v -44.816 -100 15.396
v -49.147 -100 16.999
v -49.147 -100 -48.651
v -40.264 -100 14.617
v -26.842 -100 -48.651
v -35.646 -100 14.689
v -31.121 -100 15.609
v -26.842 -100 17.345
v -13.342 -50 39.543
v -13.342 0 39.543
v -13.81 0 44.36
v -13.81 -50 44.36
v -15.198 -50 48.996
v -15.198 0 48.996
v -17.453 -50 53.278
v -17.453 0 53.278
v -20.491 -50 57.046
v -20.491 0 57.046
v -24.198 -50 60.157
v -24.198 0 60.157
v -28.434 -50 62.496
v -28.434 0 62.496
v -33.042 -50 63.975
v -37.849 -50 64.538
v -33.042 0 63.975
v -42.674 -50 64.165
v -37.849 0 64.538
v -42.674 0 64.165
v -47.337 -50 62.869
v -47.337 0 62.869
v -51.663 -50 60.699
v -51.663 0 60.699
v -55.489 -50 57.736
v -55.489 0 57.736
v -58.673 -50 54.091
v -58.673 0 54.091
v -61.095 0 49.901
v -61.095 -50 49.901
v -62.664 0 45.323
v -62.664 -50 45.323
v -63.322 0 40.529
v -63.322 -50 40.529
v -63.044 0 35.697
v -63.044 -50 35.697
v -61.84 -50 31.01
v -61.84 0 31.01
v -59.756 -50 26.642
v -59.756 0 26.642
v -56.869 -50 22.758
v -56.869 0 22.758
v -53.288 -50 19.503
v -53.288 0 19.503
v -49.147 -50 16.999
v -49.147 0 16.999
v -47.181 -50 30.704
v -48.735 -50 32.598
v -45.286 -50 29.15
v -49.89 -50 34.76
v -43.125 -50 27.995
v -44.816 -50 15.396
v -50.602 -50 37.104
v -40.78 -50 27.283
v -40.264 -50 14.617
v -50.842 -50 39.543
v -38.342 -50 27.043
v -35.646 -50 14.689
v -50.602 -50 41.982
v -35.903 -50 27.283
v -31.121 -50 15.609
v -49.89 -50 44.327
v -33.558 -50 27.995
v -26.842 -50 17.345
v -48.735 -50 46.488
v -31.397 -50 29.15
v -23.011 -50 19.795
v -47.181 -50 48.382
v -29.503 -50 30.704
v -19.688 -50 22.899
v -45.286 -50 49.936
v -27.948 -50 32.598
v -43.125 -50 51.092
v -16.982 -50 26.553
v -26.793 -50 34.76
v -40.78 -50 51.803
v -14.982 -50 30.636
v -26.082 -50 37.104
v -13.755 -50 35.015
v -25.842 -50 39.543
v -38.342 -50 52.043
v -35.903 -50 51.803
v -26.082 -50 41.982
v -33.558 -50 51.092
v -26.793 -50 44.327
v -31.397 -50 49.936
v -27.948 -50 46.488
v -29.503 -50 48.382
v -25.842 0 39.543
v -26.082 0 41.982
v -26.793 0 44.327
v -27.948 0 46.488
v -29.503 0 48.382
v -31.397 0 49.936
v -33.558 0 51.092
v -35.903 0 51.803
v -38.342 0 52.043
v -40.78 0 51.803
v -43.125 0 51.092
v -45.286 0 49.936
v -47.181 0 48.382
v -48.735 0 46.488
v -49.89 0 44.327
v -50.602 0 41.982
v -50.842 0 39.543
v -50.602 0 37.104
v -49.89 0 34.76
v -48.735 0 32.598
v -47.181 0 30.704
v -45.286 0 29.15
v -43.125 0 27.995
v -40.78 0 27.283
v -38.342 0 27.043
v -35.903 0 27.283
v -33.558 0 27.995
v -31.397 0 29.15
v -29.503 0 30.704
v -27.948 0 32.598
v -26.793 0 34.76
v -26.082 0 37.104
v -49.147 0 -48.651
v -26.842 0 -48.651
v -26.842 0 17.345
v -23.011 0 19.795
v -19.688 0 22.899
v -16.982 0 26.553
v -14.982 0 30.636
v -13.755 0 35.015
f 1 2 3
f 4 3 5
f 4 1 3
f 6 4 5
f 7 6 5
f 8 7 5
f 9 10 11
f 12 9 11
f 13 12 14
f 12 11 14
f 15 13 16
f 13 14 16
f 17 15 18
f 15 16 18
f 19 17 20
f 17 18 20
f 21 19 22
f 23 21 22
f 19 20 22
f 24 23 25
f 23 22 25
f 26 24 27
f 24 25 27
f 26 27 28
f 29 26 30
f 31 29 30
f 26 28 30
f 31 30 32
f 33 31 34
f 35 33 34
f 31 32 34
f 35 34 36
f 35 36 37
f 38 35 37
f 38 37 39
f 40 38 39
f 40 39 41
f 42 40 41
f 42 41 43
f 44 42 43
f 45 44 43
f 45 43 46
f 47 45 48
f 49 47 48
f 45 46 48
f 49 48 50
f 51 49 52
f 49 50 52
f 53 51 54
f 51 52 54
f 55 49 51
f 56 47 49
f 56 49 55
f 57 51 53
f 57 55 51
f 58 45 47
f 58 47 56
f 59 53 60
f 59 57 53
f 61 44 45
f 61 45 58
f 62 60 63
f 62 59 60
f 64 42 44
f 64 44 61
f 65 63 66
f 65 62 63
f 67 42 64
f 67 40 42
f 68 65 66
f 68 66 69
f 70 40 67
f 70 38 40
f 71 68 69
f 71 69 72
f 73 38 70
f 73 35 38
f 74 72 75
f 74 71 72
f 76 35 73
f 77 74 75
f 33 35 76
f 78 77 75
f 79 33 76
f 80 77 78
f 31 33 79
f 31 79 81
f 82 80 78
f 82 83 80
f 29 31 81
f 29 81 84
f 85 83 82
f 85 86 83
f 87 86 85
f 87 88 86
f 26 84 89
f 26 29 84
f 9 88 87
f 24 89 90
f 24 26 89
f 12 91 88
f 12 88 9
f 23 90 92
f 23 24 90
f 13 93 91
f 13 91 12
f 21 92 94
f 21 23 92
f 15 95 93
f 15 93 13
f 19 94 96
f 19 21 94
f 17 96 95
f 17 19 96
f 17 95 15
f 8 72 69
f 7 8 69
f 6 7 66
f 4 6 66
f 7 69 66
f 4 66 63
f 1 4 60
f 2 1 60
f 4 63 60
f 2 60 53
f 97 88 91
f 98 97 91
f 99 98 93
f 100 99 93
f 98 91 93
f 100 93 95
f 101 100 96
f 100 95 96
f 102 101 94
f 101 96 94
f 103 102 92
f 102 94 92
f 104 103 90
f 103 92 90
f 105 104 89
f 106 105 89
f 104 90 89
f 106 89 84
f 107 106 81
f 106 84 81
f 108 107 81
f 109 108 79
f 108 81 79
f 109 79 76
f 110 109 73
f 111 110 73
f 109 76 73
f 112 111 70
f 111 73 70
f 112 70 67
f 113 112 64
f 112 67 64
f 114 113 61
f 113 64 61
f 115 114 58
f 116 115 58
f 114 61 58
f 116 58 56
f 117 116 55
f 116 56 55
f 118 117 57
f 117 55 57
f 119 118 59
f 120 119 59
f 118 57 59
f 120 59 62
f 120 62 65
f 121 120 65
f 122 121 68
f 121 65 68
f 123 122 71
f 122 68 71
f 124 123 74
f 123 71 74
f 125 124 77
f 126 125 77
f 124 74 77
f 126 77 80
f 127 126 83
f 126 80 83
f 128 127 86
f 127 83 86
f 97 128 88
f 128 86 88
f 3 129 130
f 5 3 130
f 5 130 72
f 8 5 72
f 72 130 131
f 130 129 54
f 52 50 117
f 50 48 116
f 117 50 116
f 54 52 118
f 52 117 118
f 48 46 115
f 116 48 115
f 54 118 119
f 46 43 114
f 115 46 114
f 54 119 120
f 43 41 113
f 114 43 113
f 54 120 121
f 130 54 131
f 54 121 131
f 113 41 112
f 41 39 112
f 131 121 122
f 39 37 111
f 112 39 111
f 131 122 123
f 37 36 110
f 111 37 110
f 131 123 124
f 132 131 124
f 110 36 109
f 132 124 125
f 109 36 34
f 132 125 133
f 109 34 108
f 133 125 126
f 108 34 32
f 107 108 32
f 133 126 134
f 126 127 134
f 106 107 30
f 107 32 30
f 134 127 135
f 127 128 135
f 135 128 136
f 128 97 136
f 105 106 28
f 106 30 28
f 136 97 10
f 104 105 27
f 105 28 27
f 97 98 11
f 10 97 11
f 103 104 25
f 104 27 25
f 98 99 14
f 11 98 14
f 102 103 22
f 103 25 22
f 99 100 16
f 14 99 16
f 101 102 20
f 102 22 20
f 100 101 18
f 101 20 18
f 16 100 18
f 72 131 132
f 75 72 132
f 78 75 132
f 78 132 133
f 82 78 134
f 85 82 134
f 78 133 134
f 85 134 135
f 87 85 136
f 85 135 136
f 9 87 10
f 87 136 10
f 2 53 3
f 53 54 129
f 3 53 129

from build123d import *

# Parameters (mm, degrees)
F1_DEPTH = 50
F2_DEPTH = 100
F3_R     = 12.5
F4_DEPTH = 50


with BuildPart() as f1:
    # F0 (on Front) → F1 (new body)
    with BuildSketch(Plane.XZ):
        with BuildLine():
            ThreePointArc((-26.841883, 17.345133), (-16.981857, 26.552726), (-13.341859, 39.543118))
            ThreePointArc((-13.341859, 39.543118), (-51.662583, 60.698692), (-49.146524, 16.998513))
            ThreePointArc((-49.146524, 16.998513), (-37.953399, 14.546136), (-26.841883, 17.345133))
        make_face()
    extrude(amount=F1_DEPTH)

    # F0 (on Front) → F2 (join)
    with BuildSketch(Plane.XZ):
        with BuildLine():
            ThreePointArc((-26.841883, 17.345133), (-37.953399, 14.546136), (-49.146524, 16.998513))
            Line((-49.146524, 16.998513), (-49.146524, -48.650906))
            Line((-49.146524, -48.650906), (-26.841883, -48.650906))
            Line((-26.841883, -48.650906), (-26.841883, 17.345133))
        make_face()
    extrude(amount=F2_DEPTH)

    # F3 (on face) → F4 (cut)
    with BuildSketch(Plane.XZ.offset(50)):
        with Locations((-38.341859, 39.543118)):
            Circle(F3_R)
    extrude(amount=-F4_DEPTH, mode=Mode.SUBTRACT)


solid = f1.part
